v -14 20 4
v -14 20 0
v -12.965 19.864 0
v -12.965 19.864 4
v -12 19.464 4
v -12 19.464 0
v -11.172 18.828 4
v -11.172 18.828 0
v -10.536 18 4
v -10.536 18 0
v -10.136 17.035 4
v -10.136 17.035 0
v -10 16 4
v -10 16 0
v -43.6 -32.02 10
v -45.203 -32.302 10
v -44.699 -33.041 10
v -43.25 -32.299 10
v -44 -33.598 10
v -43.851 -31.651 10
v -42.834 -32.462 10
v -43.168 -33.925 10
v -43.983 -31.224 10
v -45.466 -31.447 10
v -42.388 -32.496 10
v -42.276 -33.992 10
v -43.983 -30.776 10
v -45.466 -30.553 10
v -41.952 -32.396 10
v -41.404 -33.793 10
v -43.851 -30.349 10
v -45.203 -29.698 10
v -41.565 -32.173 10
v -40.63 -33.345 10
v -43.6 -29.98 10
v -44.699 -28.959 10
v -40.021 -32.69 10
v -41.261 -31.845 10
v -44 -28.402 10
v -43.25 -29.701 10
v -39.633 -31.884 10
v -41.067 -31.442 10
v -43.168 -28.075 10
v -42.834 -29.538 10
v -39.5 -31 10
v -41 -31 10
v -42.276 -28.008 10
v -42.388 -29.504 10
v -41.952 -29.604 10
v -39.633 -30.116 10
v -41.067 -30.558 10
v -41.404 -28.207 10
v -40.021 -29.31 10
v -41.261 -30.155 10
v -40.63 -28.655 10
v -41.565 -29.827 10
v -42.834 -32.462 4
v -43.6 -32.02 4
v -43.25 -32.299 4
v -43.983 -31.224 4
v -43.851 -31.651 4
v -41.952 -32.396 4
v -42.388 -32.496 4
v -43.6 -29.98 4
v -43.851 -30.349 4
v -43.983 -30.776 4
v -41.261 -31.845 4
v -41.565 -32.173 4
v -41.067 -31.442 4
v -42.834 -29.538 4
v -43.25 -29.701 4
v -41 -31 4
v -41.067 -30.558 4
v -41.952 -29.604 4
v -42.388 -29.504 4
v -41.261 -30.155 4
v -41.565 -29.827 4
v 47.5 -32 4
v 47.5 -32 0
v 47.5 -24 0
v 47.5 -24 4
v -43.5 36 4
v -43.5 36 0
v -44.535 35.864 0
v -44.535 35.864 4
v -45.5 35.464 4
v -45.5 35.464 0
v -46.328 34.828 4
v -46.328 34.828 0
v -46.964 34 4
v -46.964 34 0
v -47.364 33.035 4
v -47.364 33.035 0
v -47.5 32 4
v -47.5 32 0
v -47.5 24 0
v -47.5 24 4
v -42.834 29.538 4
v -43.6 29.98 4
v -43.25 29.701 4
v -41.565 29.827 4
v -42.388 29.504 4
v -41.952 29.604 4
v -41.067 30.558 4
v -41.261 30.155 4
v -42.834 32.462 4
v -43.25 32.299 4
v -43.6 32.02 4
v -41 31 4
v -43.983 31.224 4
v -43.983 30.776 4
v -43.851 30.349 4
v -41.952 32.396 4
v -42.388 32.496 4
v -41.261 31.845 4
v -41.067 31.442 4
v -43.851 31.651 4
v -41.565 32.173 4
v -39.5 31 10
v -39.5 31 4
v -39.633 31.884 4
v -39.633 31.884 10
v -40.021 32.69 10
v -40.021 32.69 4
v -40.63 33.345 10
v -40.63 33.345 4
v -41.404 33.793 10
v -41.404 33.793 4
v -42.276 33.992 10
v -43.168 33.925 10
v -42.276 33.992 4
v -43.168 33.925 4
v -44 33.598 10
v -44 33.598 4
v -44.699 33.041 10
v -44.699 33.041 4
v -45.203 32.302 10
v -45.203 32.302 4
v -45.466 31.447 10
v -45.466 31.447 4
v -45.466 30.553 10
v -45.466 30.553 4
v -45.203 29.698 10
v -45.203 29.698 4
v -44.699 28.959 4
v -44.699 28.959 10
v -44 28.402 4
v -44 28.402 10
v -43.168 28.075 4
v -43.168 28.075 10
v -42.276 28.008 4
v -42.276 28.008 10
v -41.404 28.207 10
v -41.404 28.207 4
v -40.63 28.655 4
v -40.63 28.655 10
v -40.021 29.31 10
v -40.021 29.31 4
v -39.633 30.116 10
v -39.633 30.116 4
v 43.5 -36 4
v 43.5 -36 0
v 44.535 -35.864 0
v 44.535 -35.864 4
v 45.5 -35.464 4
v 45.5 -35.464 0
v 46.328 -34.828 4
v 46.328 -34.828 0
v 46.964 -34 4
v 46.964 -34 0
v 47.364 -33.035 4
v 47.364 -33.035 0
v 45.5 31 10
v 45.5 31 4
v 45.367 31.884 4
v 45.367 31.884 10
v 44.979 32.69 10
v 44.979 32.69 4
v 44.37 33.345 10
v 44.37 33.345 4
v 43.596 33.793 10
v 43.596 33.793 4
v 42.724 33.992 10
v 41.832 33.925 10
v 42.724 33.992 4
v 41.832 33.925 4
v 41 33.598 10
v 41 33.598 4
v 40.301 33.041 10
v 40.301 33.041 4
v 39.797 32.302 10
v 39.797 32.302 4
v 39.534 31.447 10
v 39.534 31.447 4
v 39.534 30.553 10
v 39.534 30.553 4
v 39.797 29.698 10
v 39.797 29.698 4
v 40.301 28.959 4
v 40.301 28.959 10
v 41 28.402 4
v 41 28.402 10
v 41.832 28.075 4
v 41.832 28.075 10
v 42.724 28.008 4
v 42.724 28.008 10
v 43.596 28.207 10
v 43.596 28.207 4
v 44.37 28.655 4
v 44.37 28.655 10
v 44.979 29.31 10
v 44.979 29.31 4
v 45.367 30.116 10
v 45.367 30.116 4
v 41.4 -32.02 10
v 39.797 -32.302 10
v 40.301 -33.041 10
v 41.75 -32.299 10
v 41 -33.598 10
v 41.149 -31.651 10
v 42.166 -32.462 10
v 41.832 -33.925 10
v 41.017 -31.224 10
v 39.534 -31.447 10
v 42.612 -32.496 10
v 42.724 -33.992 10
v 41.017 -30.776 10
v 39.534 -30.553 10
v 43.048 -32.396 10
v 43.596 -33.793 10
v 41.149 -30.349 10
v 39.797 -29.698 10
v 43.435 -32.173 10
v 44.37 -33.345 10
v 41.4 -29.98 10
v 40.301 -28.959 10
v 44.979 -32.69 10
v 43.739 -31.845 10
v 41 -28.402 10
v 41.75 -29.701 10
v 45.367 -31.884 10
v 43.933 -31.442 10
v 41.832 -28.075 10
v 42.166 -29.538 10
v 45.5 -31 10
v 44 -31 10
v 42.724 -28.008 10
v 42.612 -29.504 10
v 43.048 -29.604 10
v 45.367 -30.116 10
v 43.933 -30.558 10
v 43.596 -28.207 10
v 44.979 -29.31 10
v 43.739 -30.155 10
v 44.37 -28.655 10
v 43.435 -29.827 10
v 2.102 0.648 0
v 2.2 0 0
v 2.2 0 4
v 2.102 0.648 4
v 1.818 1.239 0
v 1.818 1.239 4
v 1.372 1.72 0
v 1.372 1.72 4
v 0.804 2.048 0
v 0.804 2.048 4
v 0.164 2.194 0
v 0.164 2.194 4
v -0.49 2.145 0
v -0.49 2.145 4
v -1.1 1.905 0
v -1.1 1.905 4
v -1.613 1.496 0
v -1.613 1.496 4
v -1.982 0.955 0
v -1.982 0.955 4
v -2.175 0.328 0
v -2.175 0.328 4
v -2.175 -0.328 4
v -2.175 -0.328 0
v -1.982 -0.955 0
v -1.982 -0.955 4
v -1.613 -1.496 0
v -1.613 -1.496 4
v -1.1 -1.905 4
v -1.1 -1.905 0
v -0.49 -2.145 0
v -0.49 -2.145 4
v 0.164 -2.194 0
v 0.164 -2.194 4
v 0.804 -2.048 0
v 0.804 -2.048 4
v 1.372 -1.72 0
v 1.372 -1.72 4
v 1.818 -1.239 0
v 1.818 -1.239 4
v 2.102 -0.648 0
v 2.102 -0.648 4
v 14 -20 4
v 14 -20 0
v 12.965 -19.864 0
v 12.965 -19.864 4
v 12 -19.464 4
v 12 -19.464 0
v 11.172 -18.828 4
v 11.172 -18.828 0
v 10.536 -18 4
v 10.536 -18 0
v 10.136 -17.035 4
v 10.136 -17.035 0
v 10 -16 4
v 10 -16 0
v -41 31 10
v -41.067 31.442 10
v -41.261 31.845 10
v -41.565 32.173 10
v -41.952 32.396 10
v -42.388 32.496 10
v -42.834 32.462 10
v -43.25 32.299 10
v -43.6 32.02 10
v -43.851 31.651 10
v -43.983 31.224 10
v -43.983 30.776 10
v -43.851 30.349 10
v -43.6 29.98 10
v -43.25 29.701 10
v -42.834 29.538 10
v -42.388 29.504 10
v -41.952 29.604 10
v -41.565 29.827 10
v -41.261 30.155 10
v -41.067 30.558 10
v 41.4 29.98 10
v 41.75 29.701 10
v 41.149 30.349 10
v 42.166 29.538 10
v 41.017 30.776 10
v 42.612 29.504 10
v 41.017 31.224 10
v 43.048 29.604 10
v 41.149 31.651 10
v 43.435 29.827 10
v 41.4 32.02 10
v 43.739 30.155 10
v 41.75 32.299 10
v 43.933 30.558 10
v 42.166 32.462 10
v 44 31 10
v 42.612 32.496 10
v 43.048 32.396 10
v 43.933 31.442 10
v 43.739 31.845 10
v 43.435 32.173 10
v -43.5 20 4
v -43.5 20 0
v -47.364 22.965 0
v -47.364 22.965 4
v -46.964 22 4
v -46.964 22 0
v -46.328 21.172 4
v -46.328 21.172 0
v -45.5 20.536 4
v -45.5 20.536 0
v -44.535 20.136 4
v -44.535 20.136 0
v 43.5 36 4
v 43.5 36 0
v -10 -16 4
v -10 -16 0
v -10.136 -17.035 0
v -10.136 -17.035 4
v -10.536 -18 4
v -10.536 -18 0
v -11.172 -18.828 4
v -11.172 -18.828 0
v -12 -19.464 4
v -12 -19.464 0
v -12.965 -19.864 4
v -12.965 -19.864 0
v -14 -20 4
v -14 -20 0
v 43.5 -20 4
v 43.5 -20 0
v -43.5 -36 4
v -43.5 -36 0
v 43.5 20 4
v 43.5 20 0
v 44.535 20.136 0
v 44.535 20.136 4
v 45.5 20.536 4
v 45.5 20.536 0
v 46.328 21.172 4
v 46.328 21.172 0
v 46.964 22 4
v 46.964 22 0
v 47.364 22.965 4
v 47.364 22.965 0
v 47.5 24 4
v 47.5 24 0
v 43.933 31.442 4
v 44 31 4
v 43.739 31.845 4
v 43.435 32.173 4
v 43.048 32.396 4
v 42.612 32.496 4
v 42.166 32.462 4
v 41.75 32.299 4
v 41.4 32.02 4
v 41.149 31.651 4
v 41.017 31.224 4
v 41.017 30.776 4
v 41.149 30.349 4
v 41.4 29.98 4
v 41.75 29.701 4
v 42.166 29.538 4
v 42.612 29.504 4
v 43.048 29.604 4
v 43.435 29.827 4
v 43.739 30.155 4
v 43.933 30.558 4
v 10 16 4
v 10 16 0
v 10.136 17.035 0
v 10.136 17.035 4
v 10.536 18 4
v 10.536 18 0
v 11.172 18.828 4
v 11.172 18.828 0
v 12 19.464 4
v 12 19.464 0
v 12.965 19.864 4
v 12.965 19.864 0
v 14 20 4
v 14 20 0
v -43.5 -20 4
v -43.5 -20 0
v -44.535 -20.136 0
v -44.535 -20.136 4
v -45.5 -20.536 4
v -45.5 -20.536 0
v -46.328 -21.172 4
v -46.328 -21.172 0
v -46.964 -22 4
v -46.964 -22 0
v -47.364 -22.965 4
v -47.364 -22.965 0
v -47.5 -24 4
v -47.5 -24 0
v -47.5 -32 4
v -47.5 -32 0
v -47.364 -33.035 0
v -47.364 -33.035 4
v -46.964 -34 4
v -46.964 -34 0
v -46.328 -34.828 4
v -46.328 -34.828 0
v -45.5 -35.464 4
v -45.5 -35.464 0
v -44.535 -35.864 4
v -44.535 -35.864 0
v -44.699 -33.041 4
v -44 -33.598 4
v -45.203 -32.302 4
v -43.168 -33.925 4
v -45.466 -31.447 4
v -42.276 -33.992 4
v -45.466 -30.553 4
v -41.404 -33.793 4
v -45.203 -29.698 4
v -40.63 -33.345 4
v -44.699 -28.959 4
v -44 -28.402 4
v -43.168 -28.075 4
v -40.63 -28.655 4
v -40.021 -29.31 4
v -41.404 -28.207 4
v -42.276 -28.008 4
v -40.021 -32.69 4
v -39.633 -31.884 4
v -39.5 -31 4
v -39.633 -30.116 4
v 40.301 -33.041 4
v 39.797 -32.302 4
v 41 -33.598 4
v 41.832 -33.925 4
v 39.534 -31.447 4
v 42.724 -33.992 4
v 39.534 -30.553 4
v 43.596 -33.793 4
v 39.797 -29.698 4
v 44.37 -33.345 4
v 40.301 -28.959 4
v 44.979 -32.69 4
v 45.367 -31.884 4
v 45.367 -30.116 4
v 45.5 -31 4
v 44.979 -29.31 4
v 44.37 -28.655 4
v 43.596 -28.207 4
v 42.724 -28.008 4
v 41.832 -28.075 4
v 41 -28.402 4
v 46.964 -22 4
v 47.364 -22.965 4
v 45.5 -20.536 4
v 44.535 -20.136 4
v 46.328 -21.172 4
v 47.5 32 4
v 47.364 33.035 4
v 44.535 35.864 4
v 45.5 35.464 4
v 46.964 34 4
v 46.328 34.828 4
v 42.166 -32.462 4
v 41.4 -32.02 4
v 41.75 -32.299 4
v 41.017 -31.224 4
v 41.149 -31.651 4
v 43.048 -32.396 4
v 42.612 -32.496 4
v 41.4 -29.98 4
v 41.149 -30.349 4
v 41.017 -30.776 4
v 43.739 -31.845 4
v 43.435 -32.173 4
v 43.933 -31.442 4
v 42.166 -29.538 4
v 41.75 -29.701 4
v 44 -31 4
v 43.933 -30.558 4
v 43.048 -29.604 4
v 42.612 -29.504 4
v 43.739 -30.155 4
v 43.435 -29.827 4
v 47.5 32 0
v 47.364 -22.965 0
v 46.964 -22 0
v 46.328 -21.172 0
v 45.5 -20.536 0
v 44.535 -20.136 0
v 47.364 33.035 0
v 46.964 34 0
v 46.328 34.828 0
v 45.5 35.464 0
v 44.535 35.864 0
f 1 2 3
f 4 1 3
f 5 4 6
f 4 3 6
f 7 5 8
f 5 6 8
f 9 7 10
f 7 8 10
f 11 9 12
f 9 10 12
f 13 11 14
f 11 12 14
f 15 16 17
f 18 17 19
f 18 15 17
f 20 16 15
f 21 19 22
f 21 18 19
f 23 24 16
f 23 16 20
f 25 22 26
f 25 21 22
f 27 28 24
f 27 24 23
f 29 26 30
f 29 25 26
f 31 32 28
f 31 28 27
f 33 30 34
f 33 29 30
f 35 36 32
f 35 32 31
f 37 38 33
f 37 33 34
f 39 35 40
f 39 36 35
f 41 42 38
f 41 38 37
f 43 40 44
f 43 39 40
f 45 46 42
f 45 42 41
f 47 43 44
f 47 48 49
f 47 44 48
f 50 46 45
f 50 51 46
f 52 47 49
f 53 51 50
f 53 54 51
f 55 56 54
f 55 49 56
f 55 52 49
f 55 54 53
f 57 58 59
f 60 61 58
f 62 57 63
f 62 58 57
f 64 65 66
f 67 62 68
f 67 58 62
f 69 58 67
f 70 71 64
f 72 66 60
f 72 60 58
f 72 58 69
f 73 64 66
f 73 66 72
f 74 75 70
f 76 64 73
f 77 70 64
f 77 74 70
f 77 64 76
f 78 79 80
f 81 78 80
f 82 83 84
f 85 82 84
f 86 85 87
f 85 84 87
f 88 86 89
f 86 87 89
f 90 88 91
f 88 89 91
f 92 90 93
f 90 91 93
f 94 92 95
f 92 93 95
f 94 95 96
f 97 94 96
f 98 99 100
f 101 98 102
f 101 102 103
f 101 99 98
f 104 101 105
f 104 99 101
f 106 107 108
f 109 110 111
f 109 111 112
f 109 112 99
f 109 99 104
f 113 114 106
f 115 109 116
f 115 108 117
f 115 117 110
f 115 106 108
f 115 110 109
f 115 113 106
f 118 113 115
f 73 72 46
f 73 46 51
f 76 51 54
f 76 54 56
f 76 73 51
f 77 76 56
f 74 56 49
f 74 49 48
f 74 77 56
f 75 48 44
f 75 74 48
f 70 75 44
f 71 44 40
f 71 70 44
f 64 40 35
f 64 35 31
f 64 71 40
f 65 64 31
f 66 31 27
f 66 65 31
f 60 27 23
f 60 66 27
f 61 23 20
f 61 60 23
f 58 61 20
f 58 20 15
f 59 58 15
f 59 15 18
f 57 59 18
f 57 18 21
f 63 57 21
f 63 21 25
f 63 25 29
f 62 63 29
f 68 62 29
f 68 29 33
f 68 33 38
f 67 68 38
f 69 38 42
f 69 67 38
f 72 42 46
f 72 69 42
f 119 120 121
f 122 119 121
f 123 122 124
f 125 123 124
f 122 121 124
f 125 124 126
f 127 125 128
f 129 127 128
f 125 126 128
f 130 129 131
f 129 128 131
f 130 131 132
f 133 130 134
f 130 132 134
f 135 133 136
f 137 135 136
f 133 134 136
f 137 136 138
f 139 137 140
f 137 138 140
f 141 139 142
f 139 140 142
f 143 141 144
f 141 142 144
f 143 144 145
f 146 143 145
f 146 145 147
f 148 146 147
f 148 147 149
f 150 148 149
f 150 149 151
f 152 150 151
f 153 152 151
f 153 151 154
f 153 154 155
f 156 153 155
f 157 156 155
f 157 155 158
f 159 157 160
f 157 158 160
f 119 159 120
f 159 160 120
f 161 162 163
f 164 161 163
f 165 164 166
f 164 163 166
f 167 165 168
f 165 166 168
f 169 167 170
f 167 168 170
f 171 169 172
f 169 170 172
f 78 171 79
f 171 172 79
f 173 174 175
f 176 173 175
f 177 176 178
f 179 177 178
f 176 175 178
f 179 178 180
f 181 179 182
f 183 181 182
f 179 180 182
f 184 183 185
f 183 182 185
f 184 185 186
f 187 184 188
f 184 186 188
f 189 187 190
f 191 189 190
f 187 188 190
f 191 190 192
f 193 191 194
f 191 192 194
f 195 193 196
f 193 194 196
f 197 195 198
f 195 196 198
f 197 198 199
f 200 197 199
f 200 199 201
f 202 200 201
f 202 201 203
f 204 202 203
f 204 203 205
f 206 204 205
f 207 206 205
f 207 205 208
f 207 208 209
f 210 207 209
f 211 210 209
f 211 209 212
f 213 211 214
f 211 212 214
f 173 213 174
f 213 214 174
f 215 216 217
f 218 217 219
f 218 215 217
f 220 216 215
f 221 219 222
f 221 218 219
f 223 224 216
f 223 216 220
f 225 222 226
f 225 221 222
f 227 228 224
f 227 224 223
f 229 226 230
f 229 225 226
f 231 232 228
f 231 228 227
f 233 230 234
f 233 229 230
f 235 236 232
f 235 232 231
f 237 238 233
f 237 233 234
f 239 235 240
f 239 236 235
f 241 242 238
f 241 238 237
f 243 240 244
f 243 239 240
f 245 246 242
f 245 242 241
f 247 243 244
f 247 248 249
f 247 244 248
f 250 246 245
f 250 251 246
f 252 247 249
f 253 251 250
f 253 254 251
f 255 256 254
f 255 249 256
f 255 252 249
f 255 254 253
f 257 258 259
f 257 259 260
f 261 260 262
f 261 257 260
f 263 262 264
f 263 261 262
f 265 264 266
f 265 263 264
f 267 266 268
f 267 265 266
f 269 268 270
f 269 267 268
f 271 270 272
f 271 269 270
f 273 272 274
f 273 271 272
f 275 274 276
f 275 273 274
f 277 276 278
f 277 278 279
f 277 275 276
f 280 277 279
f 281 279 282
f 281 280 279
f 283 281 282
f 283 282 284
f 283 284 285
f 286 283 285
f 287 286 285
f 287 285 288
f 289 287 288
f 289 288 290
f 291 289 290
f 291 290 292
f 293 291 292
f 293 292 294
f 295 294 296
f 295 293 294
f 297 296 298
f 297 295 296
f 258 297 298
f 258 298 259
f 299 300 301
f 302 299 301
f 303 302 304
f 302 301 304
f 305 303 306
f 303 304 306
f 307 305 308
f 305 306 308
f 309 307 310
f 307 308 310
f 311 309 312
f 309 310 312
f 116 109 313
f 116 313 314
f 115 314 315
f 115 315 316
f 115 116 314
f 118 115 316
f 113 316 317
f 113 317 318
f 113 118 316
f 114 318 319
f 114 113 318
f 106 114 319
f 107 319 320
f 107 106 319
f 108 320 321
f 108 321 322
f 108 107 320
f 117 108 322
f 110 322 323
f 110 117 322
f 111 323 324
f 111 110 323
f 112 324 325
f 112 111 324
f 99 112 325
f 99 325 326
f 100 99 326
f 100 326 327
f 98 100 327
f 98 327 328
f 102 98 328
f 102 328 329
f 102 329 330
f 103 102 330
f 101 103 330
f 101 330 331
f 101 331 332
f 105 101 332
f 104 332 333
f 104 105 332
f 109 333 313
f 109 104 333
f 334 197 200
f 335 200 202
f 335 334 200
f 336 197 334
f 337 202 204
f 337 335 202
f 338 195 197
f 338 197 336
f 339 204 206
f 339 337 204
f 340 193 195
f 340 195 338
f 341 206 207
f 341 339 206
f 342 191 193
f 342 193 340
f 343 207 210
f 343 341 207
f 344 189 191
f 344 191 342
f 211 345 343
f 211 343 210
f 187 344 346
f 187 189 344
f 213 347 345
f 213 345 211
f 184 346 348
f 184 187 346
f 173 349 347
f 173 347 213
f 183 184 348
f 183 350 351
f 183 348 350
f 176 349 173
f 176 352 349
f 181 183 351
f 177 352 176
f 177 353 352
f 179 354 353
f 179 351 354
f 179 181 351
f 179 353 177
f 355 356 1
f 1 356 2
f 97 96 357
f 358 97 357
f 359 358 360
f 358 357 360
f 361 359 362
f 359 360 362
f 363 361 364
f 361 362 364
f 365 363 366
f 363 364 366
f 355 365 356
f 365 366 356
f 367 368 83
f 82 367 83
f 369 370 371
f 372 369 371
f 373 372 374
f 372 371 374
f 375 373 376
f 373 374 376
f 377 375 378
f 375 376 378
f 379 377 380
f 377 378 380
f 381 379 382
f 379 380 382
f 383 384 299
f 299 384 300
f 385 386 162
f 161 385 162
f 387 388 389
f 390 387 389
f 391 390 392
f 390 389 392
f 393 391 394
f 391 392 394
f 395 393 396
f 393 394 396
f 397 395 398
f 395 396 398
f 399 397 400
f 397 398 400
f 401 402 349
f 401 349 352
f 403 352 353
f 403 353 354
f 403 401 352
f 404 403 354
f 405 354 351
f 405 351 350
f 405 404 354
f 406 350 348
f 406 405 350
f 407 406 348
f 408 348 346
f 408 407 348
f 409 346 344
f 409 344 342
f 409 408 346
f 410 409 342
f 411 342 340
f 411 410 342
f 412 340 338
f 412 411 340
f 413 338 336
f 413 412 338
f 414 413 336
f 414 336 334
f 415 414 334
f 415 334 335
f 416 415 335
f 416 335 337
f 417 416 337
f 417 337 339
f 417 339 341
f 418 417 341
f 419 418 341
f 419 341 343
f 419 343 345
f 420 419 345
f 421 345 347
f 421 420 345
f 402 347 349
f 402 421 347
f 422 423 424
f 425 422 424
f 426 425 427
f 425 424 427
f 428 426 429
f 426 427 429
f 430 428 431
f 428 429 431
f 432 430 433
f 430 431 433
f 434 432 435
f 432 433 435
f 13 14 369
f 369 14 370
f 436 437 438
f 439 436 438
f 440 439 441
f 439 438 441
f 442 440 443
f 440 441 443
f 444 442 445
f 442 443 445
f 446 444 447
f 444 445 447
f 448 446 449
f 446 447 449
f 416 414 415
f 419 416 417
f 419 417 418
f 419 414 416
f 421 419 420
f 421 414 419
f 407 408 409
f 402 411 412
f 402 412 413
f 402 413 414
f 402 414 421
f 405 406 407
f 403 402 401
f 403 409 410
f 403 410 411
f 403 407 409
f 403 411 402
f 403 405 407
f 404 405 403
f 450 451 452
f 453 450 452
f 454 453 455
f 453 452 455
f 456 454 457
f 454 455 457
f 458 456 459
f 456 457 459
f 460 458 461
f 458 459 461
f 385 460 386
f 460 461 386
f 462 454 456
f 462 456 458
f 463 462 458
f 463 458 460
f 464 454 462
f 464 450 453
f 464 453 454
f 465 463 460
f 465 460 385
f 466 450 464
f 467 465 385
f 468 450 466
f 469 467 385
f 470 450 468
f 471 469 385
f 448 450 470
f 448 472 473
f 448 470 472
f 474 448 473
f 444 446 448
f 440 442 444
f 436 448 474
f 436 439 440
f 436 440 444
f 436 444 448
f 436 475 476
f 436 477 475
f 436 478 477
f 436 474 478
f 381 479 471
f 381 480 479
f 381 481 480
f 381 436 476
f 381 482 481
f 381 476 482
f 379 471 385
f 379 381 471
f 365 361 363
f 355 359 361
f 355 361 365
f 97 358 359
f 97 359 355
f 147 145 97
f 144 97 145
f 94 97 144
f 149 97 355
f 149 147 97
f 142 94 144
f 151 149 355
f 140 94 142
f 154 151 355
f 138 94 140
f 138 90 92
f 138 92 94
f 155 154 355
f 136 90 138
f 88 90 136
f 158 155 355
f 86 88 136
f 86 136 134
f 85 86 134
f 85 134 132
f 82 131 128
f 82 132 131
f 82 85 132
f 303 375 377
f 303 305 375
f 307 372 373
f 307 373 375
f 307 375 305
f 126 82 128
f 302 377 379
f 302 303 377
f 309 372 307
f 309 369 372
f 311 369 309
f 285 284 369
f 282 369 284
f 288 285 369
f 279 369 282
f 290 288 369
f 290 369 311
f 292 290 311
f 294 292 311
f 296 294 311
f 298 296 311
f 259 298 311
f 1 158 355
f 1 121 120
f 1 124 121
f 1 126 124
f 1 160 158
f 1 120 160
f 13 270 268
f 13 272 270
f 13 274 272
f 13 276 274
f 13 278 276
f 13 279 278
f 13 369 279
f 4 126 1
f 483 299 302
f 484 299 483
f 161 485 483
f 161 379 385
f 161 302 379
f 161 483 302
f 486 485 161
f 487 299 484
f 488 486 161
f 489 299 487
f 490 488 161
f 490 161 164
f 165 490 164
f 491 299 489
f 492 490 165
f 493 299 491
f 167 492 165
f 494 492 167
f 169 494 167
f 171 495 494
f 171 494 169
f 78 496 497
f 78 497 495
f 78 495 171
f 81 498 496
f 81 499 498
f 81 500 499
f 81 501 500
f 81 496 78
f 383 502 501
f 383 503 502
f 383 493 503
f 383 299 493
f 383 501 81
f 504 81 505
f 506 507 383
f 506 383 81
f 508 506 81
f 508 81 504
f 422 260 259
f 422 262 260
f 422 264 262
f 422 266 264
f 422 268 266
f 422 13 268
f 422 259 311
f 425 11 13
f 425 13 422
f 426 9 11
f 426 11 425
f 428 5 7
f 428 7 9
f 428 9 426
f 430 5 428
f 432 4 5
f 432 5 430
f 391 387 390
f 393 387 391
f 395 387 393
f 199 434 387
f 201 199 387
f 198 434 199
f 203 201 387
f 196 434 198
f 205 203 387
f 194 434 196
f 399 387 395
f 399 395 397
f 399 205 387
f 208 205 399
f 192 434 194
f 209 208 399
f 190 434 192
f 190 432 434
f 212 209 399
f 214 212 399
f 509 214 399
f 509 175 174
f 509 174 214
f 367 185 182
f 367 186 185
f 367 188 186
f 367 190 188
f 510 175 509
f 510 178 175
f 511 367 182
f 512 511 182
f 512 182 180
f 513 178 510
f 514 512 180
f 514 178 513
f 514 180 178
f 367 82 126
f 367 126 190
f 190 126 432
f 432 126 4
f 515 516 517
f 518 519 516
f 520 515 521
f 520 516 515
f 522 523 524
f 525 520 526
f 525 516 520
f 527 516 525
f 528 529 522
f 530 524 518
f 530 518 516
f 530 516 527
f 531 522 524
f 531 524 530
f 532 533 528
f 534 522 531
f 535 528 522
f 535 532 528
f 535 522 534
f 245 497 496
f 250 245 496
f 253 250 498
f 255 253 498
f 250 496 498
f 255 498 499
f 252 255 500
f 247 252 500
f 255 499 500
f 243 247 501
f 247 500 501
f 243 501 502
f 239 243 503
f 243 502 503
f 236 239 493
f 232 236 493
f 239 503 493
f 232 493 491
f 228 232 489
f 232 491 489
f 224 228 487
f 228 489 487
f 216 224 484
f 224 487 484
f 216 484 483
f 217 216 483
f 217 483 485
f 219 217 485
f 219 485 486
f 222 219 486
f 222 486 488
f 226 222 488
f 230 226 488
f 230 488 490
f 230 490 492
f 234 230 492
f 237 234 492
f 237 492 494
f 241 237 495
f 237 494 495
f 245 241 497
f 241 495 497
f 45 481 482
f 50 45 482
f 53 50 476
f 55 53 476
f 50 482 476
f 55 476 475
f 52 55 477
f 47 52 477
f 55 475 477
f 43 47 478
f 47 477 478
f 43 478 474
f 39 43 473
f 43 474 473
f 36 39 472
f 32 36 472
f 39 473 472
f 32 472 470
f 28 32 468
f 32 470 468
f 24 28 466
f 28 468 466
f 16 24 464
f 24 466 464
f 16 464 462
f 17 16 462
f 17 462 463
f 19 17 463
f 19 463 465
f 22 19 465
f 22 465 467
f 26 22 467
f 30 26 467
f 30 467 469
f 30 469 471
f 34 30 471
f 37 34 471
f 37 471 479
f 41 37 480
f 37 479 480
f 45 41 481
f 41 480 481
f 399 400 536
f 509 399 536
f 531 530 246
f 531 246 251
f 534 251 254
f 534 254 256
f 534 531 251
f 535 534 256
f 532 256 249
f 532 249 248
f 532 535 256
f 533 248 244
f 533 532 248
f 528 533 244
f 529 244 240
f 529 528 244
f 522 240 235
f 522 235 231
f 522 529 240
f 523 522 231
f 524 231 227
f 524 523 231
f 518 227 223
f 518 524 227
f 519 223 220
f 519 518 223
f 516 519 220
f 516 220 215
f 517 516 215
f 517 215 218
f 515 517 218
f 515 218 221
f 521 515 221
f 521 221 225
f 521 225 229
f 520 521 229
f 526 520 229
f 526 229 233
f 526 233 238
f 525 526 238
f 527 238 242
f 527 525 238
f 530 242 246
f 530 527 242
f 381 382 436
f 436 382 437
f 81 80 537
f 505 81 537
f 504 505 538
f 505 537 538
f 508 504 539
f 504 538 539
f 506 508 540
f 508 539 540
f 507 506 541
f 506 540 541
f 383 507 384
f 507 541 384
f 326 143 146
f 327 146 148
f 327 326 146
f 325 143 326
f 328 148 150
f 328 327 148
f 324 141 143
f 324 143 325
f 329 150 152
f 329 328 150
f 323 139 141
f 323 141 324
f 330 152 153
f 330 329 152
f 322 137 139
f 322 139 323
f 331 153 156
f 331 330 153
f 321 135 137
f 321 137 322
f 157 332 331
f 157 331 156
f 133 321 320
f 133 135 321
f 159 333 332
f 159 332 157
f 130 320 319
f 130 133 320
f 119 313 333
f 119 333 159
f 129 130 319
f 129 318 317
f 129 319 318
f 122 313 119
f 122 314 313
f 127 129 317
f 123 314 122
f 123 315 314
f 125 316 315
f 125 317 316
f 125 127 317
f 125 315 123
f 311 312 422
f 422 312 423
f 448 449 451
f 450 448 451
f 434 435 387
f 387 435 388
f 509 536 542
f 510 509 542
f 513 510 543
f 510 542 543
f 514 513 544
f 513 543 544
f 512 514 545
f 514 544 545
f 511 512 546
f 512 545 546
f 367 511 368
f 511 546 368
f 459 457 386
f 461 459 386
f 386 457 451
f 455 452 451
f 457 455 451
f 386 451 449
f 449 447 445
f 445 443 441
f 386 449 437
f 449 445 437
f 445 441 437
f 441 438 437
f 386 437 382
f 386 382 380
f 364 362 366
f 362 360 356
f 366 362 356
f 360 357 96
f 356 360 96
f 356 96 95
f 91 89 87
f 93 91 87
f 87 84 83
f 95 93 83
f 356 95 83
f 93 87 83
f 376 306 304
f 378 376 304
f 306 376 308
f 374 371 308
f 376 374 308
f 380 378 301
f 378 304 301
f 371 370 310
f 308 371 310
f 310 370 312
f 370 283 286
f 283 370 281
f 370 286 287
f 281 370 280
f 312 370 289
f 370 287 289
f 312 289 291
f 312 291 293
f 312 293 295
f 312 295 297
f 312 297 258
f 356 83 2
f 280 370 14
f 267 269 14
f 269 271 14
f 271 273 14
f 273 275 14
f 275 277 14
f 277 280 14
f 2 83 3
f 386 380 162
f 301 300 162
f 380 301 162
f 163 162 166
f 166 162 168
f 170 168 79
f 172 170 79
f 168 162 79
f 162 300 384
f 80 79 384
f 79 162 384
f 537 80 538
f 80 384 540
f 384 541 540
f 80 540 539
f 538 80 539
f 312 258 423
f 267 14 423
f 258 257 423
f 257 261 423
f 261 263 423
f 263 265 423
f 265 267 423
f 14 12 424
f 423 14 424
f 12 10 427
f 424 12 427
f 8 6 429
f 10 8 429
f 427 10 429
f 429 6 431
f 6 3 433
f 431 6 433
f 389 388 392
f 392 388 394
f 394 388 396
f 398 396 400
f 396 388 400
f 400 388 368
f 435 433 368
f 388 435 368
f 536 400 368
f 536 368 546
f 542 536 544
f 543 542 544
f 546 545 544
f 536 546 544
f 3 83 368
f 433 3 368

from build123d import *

# Parameters (mm, degrees)
F0_R     = 2.2
F1_DEPTH = 4
F2_R     = 3
F2_R_2   = 1.5
F3_DEPTH = 6


with BuildPart() as f1:
    # F0 (on Top) → F1 (new body)
    with BuildSketch(Plane.XY):
        with BuildLine():
            ThreePointArc((47.5, 32), (46.328427, 34.828427), (43.5, 36))
            Line((43.5, 36), (-43.5, 36))
            ThreePointArc((-43.5, 36), (-46.328427, 34.828427), (-47.5, 32))
            Line((-47.5, 32), (-47.5, 24))
            ThreePointArc((-47.5, 24), (-46.328427, 21.171573), (-43.5, 20))
            Line((-43.5, 20), (-14, 20))
            ThreePointArc((-14, 20), (-11.171573, 18.828427), (-10, 16))
            Line((-10, 16), (-10, -16))
            ThreePointArc((-10, -16), (-11.171573, -18.828427), (-14, -20))
            Line((-14, -20), (-43.5, -20))
            ThreePointArc((-43.5, -20), (-46.328427, -21.171573), (-47.5, -24))
            Line((-47.5, -24), (-47.5, -32))
            ThreePointArc((-47.5, -32), (-46.328427, -34.828427), (-43.5, -36))
            Line((-43.5, -36), (43.5, -36))
            ThreePointArc((43.5, -36), (46.328427, -34.828427), (47.5, -32))
            Line((47.5, -32), (47.5, -24))
            ThreePointArc((47.5, -24), (46.328427, -21.171573), (43.5, -20))
            Line((43.5, -20), (14, -20))
            ThreePointArc((14, -20), (11.171573, -18.828427), (10, -16))
            Line((10, -16), (10, 16))
            ThreePointArc((10, 16), (11.171573, 18.828427), (14, 20))
            Line((14, 20), (43.5, 20))
            ThreePointArc((43.5, 20), (46.328427, 21.171573), (47.5, 24))
            Line((47.5, 24), (47.5, 32))
        make_face()
        Circle(F0_R, mode=Mode.SUBTRACT)
    extrude(amount=F1_DEPTH)

    # F2 (on face) → F3 (join)
    with BuildSketch(Plane.XY.offset(4)):
        with Locations((-42.5, 31)):
            Circle(F2_R)
        with Locations((-42.5, 31)):
            Circle(F2_R_2, mode=Mode.SUBTRACT)
        with Locations((42.5, 31)):
            Circle(F2_R)
        with Locations((42.5, 31)):
            Circle(F2_R_2, mode=Mode.SUBTRACT)
        with Locations((42.5, -31)):
            Circle(F2_R)
        with Locations((42.5, -31)):
            Circle(F2_R_2, mode=Mode.SUBTRACT)
        with Locations((-42.5, -31)):
            Circle(F2_R)
        with Locations((-42.5, -31)):
            Circle(F2_R_2, mode=Mode.SUBTRACT)
    extrude(amount=F3_DEPTH)


solid = f1.part
